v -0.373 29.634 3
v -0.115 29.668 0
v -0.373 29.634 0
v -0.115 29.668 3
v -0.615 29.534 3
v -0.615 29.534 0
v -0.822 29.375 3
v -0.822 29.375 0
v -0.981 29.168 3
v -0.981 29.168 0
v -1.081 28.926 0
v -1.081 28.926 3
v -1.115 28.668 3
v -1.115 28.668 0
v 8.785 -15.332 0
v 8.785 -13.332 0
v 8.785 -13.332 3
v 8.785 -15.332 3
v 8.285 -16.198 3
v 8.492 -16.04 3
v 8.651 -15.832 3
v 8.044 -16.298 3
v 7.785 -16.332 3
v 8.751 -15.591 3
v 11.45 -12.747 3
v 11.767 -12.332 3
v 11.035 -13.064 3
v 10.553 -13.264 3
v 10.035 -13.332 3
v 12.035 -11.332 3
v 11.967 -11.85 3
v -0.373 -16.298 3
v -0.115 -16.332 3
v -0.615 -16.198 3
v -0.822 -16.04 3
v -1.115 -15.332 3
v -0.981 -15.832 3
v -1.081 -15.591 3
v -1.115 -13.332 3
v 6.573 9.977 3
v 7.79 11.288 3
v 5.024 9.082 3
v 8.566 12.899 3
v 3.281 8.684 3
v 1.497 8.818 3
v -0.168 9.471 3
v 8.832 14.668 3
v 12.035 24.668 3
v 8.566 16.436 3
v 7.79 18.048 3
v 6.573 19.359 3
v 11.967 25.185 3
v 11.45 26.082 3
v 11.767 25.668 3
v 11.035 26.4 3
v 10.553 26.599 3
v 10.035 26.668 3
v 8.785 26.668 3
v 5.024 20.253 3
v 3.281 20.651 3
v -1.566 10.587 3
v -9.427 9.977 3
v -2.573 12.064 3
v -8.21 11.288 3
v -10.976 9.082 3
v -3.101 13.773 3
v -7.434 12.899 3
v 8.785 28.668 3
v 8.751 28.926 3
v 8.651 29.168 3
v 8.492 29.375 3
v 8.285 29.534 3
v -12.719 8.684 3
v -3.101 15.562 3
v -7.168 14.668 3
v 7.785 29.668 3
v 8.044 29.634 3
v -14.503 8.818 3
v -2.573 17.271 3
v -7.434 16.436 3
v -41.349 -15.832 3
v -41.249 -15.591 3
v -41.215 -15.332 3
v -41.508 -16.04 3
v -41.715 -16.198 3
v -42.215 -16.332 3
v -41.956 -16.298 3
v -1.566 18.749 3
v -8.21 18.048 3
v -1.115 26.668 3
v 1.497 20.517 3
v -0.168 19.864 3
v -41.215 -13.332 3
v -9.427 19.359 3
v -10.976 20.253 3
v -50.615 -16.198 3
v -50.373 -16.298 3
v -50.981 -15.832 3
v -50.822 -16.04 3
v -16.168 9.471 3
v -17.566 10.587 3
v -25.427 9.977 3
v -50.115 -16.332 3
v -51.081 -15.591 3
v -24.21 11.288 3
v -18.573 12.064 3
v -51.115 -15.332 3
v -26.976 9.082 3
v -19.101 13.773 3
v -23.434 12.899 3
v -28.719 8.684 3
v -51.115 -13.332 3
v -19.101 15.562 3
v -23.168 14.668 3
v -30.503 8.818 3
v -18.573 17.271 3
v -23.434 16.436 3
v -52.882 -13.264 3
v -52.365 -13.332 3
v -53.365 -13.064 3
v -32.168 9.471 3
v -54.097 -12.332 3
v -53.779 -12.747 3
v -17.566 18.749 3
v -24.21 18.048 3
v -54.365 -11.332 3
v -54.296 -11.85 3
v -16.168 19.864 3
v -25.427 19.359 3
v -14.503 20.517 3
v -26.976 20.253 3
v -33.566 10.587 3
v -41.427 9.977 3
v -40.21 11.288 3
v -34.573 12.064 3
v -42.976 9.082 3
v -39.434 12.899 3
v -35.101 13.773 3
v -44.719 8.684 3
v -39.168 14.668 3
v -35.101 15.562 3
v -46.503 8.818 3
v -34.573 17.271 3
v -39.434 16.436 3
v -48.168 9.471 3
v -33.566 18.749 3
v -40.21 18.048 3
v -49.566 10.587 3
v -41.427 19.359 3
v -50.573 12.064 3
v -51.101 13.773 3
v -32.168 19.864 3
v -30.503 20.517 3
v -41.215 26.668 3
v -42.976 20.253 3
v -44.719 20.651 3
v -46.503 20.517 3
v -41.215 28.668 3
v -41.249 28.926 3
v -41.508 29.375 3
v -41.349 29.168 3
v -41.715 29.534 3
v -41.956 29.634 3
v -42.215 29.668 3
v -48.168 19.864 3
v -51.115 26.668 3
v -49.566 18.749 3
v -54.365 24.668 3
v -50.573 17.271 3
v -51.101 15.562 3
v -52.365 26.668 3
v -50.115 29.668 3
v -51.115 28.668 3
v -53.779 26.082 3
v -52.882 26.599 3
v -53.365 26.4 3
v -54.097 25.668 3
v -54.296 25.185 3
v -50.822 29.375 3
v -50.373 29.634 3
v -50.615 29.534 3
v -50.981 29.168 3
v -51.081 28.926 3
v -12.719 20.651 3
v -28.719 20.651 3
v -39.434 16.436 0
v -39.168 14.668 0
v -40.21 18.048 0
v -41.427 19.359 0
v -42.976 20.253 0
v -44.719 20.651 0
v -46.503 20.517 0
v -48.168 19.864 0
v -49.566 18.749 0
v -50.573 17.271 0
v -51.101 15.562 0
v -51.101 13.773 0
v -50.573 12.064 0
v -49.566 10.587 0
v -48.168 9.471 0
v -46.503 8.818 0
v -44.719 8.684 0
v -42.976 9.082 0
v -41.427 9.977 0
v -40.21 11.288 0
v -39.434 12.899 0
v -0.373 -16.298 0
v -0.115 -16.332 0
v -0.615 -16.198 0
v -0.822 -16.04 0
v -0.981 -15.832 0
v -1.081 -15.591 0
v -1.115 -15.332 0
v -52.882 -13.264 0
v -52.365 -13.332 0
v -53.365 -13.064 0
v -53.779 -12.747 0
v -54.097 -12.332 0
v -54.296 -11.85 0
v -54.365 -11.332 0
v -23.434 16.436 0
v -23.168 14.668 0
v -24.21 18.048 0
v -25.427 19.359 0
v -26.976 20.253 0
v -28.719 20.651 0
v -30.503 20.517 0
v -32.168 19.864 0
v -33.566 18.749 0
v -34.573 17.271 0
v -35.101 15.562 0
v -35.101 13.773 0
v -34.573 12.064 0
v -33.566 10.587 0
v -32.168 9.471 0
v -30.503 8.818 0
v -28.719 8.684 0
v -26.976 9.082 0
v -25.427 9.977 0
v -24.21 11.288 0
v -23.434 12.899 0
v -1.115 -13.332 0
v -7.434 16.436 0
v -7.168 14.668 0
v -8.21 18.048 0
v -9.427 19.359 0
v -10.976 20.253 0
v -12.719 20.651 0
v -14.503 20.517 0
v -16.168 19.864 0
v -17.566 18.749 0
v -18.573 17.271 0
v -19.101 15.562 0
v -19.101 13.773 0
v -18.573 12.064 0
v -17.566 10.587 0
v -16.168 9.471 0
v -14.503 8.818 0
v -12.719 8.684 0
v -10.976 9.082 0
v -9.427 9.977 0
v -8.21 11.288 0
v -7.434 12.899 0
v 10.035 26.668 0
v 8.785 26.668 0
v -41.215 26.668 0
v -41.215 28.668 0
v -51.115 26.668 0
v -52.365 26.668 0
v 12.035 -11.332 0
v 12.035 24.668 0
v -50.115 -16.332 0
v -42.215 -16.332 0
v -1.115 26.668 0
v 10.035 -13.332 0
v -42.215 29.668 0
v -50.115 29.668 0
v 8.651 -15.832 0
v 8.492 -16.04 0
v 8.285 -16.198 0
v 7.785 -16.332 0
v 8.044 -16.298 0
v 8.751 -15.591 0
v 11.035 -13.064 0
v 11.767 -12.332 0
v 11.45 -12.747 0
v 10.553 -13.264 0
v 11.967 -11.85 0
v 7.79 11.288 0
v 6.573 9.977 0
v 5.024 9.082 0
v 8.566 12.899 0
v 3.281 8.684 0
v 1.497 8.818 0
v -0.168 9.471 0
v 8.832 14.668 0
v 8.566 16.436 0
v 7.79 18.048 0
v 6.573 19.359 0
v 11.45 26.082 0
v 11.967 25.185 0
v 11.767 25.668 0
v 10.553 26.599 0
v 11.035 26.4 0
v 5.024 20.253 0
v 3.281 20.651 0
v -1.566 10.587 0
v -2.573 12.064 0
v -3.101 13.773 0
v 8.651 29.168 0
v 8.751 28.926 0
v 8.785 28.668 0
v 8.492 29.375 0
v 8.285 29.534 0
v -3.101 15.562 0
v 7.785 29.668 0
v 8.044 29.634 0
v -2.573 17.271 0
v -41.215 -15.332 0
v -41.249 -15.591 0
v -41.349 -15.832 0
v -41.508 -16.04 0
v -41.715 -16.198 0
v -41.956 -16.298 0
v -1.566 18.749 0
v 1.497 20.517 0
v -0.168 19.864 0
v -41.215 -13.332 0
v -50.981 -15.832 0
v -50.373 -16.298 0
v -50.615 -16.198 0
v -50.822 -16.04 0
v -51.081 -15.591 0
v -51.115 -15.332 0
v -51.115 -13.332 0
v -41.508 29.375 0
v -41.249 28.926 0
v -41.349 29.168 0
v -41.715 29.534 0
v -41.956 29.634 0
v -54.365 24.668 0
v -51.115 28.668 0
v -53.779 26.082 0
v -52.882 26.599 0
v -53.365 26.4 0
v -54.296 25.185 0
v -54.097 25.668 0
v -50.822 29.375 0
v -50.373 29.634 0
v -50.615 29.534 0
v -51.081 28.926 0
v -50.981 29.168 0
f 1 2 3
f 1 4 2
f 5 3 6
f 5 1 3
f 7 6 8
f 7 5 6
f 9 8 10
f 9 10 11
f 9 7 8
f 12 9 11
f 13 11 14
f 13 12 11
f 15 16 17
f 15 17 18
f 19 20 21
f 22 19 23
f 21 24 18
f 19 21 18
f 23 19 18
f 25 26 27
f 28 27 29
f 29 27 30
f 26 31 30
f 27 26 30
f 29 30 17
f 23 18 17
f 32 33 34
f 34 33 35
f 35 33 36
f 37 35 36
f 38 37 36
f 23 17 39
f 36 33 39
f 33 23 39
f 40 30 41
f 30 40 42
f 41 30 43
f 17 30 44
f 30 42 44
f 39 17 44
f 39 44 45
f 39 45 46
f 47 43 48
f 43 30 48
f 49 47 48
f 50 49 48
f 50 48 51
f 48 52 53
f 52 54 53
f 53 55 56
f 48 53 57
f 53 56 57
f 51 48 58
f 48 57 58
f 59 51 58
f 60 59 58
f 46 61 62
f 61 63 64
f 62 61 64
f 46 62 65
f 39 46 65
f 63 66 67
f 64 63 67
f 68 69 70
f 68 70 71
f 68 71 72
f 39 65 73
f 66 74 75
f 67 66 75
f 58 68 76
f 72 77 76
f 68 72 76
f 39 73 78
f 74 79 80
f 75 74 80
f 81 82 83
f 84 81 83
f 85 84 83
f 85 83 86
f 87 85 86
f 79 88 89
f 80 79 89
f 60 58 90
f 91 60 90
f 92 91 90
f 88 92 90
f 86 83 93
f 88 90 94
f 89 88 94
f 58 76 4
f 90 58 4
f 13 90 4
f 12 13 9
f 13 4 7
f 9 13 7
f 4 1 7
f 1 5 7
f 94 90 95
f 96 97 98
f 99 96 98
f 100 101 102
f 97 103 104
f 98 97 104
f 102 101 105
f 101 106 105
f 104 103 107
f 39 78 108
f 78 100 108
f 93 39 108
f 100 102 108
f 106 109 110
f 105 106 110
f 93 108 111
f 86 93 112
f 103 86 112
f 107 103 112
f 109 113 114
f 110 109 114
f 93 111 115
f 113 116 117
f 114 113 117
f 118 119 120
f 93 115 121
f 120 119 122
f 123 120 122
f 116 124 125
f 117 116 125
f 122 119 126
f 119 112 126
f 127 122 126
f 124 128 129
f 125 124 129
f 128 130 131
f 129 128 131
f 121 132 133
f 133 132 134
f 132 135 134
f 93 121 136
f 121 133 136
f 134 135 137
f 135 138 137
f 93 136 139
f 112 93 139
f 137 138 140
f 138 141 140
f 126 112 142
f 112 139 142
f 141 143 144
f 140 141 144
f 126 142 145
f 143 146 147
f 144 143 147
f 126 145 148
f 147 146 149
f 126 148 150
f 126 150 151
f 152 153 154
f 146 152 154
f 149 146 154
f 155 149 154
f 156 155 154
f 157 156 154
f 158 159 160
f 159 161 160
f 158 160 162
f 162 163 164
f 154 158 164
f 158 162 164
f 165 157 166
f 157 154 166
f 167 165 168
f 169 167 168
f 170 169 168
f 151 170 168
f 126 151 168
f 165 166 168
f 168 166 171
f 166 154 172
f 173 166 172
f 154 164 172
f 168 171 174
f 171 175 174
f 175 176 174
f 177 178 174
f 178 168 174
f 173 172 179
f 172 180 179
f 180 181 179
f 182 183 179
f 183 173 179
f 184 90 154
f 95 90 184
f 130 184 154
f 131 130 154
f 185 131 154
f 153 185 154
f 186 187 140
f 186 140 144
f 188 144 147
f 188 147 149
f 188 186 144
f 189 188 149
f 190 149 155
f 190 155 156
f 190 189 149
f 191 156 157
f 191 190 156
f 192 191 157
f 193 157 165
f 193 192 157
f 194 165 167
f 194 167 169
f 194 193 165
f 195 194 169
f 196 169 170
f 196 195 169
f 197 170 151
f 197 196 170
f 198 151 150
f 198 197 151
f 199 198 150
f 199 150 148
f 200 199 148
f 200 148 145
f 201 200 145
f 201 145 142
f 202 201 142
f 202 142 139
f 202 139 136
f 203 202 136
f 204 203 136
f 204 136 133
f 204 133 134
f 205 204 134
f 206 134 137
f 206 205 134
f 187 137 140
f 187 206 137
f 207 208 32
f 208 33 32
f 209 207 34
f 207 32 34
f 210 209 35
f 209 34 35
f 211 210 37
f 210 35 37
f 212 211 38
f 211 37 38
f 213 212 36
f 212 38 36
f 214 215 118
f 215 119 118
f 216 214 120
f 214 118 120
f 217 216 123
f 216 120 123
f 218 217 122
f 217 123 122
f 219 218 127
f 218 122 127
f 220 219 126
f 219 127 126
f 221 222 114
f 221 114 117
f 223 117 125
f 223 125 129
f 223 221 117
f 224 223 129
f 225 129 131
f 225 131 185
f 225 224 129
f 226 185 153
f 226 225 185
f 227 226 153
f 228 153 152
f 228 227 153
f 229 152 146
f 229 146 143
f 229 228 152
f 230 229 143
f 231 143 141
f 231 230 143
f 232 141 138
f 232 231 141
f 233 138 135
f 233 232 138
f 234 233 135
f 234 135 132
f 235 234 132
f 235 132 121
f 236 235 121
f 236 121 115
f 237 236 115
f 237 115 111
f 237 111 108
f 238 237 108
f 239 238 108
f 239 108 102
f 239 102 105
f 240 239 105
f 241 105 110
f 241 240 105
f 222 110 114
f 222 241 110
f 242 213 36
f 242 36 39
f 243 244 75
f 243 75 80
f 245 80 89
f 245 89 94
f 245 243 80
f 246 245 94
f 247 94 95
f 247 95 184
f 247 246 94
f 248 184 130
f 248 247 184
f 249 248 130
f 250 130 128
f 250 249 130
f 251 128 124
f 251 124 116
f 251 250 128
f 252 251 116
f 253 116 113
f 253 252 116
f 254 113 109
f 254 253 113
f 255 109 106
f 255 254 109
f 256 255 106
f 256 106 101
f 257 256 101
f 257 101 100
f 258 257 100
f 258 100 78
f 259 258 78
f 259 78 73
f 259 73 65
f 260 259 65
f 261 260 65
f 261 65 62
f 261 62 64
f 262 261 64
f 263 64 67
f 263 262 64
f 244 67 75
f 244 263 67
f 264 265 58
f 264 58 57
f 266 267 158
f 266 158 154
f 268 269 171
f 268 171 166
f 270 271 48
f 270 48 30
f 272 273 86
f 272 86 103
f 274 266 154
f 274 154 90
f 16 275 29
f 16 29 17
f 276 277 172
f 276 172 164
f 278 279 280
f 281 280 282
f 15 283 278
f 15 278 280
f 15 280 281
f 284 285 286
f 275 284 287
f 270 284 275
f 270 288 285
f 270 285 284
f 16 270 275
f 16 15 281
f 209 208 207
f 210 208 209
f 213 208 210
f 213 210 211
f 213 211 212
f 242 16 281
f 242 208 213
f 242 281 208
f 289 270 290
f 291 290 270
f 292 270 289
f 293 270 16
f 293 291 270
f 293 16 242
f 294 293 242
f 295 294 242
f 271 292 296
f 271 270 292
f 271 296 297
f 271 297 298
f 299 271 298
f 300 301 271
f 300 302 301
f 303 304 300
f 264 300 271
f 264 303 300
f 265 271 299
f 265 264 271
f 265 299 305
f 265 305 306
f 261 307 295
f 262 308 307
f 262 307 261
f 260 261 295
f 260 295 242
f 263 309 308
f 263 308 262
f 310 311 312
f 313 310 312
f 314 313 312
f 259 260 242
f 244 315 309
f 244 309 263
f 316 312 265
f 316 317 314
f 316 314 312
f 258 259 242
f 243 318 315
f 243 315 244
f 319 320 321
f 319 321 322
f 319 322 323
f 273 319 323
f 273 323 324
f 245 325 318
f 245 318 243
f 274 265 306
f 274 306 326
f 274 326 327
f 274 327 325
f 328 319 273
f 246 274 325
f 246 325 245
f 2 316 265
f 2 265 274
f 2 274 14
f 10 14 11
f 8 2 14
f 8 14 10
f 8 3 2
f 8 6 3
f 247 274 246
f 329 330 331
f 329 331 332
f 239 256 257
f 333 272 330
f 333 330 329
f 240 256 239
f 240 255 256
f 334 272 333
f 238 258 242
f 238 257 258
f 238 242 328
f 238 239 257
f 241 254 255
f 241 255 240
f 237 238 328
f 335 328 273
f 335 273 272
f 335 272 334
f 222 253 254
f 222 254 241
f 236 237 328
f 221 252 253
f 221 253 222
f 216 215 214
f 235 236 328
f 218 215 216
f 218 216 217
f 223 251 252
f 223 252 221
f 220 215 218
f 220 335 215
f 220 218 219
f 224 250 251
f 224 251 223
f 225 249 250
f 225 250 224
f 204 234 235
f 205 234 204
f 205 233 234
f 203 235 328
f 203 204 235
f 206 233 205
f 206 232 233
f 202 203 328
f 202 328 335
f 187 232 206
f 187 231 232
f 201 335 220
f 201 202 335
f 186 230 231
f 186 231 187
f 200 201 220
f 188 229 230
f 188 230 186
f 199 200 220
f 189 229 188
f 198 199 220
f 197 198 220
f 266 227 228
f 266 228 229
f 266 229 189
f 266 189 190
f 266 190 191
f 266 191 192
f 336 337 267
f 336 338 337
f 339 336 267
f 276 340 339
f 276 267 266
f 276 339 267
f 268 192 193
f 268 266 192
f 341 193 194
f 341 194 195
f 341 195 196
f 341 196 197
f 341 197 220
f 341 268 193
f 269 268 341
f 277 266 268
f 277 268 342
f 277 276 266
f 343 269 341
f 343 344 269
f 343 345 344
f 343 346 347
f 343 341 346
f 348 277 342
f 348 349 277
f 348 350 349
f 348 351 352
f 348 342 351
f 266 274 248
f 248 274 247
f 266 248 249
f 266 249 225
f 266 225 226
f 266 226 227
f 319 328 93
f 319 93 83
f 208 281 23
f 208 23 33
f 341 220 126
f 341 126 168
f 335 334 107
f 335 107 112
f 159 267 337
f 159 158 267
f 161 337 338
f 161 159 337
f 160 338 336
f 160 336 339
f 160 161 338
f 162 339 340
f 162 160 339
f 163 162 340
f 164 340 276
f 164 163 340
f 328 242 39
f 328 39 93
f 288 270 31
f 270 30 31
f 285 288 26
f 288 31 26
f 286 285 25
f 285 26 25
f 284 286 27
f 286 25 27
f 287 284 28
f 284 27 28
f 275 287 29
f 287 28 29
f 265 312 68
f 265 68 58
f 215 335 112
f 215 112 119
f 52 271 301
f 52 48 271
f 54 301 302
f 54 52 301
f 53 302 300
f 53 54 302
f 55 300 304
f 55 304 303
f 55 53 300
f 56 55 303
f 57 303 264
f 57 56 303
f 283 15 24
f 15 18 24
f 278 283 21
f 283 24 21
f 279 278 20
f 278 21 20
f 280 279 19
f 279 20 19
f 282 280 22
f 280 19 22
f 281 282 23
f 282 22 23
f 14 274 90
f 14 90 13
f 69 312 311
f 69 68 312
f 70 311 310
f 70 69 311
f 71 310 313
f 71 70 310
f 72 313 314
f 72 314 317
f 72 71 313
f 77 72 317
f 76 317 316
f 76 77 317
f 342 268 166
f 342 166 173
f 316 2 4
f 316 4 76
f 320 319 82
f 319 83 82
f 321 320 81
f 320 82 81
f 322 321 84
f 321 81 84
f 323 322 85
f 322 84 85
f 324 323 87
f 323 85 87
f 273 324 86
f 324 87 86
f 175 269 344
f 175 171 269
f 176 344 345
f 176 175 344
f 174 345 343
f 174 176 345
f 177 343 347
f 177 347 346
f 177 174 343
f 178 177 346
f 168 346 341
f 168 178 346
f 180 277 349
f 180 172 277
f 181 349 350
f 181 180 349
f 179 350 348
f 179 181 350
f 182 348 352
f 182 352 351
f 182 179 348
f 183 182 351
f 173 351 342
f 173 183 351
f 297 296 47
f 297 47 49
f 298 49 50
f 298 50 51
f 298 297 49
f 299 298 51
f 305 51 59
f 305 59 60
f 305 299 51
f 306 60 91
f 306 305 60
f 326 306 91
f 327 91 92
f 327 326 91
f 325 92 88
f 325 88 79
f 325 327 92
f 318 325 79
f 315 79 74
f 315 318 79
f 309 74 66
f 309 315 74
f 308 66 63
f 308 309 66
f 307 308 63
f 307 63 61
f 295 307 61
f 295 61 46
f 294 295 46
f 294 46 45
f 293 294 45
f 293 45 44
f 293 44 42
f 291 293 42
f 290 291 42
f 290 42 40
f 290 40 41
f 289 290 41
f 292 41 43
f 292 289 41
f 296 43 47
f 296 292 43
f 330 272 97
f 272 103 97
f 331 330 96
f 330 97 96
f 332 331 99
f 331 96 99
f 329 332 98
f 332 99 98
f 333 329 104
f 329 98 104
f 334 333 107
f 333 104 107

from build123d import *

# Parameters (mm, degrees)
SKETCH_R    = 6
PAD_DEPTH   = 3
FILLET_R    = 2
FILLET001_R = 1


with BuildPart() as part:
    # Sketch → Pad (new body)
    with BuildSketch(Plane.XY):
        Polygon((12.035368, 26.667595), (12.035368, -13.332405), (8.785368, -13.332405), (8.785368, -16.332405), (-1.114632, -16.332405), (-1.114632, -13.332405), (-41.214632, -13.332405), (-41.214632, -16.332405), (-51.114632, -16.332405), (-51.114632, -13.332405), (-54.364632, -13.332405), (-54.364632, 26.667595), (-51.114632, 26.667595), (-51.114632, 29.667595), (-41.214632, 29.667595), (-41.214632, 26.667595), (-1.114632, 26.667595), (-1.114632, 29.667595), (8.785368, 29.667595), (8.785368, 26.667595), align=None)
        with Locations((-45.167672, 14.667595)):
            Circle(SKETCH_R, mode=Mode.SUBTRACT)
        with Locations((-29.167672, 14.667595)):
            Circle(SKETCH_R, mode=Mode.SUBTRACT)
        with Locations((-13.167672, 14.667595)):
            Circle(SKETCH_R, mode=Mode.SUBTRACT)
        with Locations((2.832328, 14.667595)):
            Circle(SKETCH_R, mode=Mode.SUBTRACT)
    extrude(amount=PAD_DEPTH)

    # Fillet
    fillet_edges = [part.edges().sort_by_distance(p)[0] for p in [
        (-54.364632, 26.667595, 1.5),
        (-54.364632, -13.332405, 1.5),
        (12.035368, -13.332405, 1.5),
        (12.035368, 26.667595, 1.5),
    ]]
    fillet(fillet_edges, radius=FILLET_R)

    # Fillet001
    fillet001_edges = [part.edges().sort_by_distance(p)[0] for p in [
        (8.785368, 29.667595, 1.5),
        (-1.114632, 29.667595, 1.5),
        (-41.214632, 29.667595, 1.5),
        (-51.114632, 29.667595, 1.5),
        (-51.114632, -16.332405, 1.5),
        (-41.214632, -16.332405, 1.5),
        (-1.114632, -16.332405, 1.5),
        (8.785368, -16.332405, 1.5),
    ]]
    fillet(fillet001_edges, radius=FILLET001_R)


solid = part.part
